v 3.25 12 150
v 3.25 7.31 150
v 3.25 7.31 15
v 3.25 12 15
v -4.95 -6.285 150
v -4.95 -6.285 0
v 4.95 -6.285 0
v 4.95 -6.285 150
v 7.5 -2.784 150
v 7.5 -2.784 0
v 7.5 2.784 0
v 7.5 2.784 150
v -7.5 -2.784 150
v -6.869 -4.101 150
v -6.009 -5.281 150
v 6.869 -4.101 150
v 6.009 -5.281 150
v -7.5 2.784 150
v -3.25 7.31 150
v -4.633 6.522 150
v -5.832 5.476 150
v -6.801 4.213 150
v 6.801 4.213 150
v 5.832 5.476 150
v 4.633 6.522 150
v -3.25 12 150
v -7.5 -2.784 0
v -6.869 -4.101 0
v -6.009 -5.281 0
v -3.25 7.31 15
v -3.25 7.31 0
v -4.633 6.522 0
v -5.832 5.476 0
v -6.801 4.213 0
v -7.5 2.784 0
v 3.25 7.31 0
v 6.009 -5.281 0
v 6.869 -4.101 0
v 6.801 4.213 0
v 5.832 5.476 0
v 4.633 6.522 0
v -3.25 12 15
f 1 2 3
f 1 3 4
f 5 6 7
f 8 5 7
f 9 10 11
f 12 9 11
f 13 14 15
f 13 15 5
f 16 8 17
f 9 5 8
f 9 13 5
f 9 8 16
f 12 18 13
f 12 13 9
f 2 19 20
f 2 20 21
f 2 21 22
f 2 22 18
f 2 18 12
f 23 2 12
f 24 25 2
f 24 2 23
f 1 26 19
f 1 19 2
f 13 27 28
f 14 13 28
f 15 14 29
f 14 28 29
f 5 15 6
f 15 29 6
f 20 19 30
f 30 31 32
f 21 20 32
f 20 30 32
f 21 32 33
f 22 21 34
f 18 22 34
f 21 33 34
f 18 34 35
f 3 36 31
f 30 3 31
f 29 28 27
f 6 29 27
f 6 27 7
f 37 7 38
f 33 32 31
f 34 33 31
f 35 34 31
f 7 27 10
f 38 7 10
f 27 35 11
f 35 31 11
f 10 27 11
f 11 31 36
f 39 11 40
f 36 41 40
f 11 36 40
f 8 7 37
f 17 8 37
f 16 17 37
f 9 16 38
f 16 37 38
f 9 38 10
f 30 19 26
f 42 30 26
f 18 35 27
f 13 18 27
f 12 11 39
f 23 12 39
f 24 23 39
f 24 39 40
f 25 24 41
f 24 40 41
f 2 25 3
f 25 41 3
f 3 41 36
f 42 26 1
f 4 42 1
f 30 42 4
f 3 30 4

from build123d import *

# Parameters (mm, degrees)
BOSS_EXTRUDE1_DEPTH = 150
BOSS_EXTRUDE2_START = 150
SKETCH1_3_W         = 6.5
SKETCH1_3_H         = 4.689904241
BOSS_EXTRUDE2_DEPTH = 135


with BuildPart() as part:
    # Sketch1 → Boss-Extrude1 (new body)
    with BuildSketch(Plane.XY):
        with BuildLine():
            Line((3.25, 7.310095759), (-3.25, 7.310095759))
            ThreePointArc((-3.25, 7.310095759), (-5.832004573, 5.476104698), (-7.5, 2.783882181))
            Line((-7.5, 2.783882181), (-7.5, -2.783882181))
            ThreePointArc((-7.5, -2.783882181), (-6.466277075, -4.710335529), (-4.949623723, -6.285))
            Line((-4.949623723, -6.285), (4.949623723, -6.285))
            ThreePointArc((4.949623723, -6.285), (6.466277075, -4.710335529), (7.5, -2.783882181))
            Line((7.5, -2.783882181), (7.5, 2.783882181))
            ThreePointArc((7.5, 2.783882181), (5.832004573, 5.476104698), (3.25, 7.310095759))
        make_face()
    extrude(amount=BOSS_EXTRUDE1_DEPTH)

    # Sketch1<3> → Boss-Extrude2 (add)
    with BuildSketch(Plane.XY.offset(BOSS_EXTRUDE2_START)):
        with Locations((0, 9.655047879)):
            Rectangle(SKETCH1_3_W, SKETCH1_3_H)
    extrude(amount=-BOSS_EXTRUDE2_DEPTH)


solid = part.part
